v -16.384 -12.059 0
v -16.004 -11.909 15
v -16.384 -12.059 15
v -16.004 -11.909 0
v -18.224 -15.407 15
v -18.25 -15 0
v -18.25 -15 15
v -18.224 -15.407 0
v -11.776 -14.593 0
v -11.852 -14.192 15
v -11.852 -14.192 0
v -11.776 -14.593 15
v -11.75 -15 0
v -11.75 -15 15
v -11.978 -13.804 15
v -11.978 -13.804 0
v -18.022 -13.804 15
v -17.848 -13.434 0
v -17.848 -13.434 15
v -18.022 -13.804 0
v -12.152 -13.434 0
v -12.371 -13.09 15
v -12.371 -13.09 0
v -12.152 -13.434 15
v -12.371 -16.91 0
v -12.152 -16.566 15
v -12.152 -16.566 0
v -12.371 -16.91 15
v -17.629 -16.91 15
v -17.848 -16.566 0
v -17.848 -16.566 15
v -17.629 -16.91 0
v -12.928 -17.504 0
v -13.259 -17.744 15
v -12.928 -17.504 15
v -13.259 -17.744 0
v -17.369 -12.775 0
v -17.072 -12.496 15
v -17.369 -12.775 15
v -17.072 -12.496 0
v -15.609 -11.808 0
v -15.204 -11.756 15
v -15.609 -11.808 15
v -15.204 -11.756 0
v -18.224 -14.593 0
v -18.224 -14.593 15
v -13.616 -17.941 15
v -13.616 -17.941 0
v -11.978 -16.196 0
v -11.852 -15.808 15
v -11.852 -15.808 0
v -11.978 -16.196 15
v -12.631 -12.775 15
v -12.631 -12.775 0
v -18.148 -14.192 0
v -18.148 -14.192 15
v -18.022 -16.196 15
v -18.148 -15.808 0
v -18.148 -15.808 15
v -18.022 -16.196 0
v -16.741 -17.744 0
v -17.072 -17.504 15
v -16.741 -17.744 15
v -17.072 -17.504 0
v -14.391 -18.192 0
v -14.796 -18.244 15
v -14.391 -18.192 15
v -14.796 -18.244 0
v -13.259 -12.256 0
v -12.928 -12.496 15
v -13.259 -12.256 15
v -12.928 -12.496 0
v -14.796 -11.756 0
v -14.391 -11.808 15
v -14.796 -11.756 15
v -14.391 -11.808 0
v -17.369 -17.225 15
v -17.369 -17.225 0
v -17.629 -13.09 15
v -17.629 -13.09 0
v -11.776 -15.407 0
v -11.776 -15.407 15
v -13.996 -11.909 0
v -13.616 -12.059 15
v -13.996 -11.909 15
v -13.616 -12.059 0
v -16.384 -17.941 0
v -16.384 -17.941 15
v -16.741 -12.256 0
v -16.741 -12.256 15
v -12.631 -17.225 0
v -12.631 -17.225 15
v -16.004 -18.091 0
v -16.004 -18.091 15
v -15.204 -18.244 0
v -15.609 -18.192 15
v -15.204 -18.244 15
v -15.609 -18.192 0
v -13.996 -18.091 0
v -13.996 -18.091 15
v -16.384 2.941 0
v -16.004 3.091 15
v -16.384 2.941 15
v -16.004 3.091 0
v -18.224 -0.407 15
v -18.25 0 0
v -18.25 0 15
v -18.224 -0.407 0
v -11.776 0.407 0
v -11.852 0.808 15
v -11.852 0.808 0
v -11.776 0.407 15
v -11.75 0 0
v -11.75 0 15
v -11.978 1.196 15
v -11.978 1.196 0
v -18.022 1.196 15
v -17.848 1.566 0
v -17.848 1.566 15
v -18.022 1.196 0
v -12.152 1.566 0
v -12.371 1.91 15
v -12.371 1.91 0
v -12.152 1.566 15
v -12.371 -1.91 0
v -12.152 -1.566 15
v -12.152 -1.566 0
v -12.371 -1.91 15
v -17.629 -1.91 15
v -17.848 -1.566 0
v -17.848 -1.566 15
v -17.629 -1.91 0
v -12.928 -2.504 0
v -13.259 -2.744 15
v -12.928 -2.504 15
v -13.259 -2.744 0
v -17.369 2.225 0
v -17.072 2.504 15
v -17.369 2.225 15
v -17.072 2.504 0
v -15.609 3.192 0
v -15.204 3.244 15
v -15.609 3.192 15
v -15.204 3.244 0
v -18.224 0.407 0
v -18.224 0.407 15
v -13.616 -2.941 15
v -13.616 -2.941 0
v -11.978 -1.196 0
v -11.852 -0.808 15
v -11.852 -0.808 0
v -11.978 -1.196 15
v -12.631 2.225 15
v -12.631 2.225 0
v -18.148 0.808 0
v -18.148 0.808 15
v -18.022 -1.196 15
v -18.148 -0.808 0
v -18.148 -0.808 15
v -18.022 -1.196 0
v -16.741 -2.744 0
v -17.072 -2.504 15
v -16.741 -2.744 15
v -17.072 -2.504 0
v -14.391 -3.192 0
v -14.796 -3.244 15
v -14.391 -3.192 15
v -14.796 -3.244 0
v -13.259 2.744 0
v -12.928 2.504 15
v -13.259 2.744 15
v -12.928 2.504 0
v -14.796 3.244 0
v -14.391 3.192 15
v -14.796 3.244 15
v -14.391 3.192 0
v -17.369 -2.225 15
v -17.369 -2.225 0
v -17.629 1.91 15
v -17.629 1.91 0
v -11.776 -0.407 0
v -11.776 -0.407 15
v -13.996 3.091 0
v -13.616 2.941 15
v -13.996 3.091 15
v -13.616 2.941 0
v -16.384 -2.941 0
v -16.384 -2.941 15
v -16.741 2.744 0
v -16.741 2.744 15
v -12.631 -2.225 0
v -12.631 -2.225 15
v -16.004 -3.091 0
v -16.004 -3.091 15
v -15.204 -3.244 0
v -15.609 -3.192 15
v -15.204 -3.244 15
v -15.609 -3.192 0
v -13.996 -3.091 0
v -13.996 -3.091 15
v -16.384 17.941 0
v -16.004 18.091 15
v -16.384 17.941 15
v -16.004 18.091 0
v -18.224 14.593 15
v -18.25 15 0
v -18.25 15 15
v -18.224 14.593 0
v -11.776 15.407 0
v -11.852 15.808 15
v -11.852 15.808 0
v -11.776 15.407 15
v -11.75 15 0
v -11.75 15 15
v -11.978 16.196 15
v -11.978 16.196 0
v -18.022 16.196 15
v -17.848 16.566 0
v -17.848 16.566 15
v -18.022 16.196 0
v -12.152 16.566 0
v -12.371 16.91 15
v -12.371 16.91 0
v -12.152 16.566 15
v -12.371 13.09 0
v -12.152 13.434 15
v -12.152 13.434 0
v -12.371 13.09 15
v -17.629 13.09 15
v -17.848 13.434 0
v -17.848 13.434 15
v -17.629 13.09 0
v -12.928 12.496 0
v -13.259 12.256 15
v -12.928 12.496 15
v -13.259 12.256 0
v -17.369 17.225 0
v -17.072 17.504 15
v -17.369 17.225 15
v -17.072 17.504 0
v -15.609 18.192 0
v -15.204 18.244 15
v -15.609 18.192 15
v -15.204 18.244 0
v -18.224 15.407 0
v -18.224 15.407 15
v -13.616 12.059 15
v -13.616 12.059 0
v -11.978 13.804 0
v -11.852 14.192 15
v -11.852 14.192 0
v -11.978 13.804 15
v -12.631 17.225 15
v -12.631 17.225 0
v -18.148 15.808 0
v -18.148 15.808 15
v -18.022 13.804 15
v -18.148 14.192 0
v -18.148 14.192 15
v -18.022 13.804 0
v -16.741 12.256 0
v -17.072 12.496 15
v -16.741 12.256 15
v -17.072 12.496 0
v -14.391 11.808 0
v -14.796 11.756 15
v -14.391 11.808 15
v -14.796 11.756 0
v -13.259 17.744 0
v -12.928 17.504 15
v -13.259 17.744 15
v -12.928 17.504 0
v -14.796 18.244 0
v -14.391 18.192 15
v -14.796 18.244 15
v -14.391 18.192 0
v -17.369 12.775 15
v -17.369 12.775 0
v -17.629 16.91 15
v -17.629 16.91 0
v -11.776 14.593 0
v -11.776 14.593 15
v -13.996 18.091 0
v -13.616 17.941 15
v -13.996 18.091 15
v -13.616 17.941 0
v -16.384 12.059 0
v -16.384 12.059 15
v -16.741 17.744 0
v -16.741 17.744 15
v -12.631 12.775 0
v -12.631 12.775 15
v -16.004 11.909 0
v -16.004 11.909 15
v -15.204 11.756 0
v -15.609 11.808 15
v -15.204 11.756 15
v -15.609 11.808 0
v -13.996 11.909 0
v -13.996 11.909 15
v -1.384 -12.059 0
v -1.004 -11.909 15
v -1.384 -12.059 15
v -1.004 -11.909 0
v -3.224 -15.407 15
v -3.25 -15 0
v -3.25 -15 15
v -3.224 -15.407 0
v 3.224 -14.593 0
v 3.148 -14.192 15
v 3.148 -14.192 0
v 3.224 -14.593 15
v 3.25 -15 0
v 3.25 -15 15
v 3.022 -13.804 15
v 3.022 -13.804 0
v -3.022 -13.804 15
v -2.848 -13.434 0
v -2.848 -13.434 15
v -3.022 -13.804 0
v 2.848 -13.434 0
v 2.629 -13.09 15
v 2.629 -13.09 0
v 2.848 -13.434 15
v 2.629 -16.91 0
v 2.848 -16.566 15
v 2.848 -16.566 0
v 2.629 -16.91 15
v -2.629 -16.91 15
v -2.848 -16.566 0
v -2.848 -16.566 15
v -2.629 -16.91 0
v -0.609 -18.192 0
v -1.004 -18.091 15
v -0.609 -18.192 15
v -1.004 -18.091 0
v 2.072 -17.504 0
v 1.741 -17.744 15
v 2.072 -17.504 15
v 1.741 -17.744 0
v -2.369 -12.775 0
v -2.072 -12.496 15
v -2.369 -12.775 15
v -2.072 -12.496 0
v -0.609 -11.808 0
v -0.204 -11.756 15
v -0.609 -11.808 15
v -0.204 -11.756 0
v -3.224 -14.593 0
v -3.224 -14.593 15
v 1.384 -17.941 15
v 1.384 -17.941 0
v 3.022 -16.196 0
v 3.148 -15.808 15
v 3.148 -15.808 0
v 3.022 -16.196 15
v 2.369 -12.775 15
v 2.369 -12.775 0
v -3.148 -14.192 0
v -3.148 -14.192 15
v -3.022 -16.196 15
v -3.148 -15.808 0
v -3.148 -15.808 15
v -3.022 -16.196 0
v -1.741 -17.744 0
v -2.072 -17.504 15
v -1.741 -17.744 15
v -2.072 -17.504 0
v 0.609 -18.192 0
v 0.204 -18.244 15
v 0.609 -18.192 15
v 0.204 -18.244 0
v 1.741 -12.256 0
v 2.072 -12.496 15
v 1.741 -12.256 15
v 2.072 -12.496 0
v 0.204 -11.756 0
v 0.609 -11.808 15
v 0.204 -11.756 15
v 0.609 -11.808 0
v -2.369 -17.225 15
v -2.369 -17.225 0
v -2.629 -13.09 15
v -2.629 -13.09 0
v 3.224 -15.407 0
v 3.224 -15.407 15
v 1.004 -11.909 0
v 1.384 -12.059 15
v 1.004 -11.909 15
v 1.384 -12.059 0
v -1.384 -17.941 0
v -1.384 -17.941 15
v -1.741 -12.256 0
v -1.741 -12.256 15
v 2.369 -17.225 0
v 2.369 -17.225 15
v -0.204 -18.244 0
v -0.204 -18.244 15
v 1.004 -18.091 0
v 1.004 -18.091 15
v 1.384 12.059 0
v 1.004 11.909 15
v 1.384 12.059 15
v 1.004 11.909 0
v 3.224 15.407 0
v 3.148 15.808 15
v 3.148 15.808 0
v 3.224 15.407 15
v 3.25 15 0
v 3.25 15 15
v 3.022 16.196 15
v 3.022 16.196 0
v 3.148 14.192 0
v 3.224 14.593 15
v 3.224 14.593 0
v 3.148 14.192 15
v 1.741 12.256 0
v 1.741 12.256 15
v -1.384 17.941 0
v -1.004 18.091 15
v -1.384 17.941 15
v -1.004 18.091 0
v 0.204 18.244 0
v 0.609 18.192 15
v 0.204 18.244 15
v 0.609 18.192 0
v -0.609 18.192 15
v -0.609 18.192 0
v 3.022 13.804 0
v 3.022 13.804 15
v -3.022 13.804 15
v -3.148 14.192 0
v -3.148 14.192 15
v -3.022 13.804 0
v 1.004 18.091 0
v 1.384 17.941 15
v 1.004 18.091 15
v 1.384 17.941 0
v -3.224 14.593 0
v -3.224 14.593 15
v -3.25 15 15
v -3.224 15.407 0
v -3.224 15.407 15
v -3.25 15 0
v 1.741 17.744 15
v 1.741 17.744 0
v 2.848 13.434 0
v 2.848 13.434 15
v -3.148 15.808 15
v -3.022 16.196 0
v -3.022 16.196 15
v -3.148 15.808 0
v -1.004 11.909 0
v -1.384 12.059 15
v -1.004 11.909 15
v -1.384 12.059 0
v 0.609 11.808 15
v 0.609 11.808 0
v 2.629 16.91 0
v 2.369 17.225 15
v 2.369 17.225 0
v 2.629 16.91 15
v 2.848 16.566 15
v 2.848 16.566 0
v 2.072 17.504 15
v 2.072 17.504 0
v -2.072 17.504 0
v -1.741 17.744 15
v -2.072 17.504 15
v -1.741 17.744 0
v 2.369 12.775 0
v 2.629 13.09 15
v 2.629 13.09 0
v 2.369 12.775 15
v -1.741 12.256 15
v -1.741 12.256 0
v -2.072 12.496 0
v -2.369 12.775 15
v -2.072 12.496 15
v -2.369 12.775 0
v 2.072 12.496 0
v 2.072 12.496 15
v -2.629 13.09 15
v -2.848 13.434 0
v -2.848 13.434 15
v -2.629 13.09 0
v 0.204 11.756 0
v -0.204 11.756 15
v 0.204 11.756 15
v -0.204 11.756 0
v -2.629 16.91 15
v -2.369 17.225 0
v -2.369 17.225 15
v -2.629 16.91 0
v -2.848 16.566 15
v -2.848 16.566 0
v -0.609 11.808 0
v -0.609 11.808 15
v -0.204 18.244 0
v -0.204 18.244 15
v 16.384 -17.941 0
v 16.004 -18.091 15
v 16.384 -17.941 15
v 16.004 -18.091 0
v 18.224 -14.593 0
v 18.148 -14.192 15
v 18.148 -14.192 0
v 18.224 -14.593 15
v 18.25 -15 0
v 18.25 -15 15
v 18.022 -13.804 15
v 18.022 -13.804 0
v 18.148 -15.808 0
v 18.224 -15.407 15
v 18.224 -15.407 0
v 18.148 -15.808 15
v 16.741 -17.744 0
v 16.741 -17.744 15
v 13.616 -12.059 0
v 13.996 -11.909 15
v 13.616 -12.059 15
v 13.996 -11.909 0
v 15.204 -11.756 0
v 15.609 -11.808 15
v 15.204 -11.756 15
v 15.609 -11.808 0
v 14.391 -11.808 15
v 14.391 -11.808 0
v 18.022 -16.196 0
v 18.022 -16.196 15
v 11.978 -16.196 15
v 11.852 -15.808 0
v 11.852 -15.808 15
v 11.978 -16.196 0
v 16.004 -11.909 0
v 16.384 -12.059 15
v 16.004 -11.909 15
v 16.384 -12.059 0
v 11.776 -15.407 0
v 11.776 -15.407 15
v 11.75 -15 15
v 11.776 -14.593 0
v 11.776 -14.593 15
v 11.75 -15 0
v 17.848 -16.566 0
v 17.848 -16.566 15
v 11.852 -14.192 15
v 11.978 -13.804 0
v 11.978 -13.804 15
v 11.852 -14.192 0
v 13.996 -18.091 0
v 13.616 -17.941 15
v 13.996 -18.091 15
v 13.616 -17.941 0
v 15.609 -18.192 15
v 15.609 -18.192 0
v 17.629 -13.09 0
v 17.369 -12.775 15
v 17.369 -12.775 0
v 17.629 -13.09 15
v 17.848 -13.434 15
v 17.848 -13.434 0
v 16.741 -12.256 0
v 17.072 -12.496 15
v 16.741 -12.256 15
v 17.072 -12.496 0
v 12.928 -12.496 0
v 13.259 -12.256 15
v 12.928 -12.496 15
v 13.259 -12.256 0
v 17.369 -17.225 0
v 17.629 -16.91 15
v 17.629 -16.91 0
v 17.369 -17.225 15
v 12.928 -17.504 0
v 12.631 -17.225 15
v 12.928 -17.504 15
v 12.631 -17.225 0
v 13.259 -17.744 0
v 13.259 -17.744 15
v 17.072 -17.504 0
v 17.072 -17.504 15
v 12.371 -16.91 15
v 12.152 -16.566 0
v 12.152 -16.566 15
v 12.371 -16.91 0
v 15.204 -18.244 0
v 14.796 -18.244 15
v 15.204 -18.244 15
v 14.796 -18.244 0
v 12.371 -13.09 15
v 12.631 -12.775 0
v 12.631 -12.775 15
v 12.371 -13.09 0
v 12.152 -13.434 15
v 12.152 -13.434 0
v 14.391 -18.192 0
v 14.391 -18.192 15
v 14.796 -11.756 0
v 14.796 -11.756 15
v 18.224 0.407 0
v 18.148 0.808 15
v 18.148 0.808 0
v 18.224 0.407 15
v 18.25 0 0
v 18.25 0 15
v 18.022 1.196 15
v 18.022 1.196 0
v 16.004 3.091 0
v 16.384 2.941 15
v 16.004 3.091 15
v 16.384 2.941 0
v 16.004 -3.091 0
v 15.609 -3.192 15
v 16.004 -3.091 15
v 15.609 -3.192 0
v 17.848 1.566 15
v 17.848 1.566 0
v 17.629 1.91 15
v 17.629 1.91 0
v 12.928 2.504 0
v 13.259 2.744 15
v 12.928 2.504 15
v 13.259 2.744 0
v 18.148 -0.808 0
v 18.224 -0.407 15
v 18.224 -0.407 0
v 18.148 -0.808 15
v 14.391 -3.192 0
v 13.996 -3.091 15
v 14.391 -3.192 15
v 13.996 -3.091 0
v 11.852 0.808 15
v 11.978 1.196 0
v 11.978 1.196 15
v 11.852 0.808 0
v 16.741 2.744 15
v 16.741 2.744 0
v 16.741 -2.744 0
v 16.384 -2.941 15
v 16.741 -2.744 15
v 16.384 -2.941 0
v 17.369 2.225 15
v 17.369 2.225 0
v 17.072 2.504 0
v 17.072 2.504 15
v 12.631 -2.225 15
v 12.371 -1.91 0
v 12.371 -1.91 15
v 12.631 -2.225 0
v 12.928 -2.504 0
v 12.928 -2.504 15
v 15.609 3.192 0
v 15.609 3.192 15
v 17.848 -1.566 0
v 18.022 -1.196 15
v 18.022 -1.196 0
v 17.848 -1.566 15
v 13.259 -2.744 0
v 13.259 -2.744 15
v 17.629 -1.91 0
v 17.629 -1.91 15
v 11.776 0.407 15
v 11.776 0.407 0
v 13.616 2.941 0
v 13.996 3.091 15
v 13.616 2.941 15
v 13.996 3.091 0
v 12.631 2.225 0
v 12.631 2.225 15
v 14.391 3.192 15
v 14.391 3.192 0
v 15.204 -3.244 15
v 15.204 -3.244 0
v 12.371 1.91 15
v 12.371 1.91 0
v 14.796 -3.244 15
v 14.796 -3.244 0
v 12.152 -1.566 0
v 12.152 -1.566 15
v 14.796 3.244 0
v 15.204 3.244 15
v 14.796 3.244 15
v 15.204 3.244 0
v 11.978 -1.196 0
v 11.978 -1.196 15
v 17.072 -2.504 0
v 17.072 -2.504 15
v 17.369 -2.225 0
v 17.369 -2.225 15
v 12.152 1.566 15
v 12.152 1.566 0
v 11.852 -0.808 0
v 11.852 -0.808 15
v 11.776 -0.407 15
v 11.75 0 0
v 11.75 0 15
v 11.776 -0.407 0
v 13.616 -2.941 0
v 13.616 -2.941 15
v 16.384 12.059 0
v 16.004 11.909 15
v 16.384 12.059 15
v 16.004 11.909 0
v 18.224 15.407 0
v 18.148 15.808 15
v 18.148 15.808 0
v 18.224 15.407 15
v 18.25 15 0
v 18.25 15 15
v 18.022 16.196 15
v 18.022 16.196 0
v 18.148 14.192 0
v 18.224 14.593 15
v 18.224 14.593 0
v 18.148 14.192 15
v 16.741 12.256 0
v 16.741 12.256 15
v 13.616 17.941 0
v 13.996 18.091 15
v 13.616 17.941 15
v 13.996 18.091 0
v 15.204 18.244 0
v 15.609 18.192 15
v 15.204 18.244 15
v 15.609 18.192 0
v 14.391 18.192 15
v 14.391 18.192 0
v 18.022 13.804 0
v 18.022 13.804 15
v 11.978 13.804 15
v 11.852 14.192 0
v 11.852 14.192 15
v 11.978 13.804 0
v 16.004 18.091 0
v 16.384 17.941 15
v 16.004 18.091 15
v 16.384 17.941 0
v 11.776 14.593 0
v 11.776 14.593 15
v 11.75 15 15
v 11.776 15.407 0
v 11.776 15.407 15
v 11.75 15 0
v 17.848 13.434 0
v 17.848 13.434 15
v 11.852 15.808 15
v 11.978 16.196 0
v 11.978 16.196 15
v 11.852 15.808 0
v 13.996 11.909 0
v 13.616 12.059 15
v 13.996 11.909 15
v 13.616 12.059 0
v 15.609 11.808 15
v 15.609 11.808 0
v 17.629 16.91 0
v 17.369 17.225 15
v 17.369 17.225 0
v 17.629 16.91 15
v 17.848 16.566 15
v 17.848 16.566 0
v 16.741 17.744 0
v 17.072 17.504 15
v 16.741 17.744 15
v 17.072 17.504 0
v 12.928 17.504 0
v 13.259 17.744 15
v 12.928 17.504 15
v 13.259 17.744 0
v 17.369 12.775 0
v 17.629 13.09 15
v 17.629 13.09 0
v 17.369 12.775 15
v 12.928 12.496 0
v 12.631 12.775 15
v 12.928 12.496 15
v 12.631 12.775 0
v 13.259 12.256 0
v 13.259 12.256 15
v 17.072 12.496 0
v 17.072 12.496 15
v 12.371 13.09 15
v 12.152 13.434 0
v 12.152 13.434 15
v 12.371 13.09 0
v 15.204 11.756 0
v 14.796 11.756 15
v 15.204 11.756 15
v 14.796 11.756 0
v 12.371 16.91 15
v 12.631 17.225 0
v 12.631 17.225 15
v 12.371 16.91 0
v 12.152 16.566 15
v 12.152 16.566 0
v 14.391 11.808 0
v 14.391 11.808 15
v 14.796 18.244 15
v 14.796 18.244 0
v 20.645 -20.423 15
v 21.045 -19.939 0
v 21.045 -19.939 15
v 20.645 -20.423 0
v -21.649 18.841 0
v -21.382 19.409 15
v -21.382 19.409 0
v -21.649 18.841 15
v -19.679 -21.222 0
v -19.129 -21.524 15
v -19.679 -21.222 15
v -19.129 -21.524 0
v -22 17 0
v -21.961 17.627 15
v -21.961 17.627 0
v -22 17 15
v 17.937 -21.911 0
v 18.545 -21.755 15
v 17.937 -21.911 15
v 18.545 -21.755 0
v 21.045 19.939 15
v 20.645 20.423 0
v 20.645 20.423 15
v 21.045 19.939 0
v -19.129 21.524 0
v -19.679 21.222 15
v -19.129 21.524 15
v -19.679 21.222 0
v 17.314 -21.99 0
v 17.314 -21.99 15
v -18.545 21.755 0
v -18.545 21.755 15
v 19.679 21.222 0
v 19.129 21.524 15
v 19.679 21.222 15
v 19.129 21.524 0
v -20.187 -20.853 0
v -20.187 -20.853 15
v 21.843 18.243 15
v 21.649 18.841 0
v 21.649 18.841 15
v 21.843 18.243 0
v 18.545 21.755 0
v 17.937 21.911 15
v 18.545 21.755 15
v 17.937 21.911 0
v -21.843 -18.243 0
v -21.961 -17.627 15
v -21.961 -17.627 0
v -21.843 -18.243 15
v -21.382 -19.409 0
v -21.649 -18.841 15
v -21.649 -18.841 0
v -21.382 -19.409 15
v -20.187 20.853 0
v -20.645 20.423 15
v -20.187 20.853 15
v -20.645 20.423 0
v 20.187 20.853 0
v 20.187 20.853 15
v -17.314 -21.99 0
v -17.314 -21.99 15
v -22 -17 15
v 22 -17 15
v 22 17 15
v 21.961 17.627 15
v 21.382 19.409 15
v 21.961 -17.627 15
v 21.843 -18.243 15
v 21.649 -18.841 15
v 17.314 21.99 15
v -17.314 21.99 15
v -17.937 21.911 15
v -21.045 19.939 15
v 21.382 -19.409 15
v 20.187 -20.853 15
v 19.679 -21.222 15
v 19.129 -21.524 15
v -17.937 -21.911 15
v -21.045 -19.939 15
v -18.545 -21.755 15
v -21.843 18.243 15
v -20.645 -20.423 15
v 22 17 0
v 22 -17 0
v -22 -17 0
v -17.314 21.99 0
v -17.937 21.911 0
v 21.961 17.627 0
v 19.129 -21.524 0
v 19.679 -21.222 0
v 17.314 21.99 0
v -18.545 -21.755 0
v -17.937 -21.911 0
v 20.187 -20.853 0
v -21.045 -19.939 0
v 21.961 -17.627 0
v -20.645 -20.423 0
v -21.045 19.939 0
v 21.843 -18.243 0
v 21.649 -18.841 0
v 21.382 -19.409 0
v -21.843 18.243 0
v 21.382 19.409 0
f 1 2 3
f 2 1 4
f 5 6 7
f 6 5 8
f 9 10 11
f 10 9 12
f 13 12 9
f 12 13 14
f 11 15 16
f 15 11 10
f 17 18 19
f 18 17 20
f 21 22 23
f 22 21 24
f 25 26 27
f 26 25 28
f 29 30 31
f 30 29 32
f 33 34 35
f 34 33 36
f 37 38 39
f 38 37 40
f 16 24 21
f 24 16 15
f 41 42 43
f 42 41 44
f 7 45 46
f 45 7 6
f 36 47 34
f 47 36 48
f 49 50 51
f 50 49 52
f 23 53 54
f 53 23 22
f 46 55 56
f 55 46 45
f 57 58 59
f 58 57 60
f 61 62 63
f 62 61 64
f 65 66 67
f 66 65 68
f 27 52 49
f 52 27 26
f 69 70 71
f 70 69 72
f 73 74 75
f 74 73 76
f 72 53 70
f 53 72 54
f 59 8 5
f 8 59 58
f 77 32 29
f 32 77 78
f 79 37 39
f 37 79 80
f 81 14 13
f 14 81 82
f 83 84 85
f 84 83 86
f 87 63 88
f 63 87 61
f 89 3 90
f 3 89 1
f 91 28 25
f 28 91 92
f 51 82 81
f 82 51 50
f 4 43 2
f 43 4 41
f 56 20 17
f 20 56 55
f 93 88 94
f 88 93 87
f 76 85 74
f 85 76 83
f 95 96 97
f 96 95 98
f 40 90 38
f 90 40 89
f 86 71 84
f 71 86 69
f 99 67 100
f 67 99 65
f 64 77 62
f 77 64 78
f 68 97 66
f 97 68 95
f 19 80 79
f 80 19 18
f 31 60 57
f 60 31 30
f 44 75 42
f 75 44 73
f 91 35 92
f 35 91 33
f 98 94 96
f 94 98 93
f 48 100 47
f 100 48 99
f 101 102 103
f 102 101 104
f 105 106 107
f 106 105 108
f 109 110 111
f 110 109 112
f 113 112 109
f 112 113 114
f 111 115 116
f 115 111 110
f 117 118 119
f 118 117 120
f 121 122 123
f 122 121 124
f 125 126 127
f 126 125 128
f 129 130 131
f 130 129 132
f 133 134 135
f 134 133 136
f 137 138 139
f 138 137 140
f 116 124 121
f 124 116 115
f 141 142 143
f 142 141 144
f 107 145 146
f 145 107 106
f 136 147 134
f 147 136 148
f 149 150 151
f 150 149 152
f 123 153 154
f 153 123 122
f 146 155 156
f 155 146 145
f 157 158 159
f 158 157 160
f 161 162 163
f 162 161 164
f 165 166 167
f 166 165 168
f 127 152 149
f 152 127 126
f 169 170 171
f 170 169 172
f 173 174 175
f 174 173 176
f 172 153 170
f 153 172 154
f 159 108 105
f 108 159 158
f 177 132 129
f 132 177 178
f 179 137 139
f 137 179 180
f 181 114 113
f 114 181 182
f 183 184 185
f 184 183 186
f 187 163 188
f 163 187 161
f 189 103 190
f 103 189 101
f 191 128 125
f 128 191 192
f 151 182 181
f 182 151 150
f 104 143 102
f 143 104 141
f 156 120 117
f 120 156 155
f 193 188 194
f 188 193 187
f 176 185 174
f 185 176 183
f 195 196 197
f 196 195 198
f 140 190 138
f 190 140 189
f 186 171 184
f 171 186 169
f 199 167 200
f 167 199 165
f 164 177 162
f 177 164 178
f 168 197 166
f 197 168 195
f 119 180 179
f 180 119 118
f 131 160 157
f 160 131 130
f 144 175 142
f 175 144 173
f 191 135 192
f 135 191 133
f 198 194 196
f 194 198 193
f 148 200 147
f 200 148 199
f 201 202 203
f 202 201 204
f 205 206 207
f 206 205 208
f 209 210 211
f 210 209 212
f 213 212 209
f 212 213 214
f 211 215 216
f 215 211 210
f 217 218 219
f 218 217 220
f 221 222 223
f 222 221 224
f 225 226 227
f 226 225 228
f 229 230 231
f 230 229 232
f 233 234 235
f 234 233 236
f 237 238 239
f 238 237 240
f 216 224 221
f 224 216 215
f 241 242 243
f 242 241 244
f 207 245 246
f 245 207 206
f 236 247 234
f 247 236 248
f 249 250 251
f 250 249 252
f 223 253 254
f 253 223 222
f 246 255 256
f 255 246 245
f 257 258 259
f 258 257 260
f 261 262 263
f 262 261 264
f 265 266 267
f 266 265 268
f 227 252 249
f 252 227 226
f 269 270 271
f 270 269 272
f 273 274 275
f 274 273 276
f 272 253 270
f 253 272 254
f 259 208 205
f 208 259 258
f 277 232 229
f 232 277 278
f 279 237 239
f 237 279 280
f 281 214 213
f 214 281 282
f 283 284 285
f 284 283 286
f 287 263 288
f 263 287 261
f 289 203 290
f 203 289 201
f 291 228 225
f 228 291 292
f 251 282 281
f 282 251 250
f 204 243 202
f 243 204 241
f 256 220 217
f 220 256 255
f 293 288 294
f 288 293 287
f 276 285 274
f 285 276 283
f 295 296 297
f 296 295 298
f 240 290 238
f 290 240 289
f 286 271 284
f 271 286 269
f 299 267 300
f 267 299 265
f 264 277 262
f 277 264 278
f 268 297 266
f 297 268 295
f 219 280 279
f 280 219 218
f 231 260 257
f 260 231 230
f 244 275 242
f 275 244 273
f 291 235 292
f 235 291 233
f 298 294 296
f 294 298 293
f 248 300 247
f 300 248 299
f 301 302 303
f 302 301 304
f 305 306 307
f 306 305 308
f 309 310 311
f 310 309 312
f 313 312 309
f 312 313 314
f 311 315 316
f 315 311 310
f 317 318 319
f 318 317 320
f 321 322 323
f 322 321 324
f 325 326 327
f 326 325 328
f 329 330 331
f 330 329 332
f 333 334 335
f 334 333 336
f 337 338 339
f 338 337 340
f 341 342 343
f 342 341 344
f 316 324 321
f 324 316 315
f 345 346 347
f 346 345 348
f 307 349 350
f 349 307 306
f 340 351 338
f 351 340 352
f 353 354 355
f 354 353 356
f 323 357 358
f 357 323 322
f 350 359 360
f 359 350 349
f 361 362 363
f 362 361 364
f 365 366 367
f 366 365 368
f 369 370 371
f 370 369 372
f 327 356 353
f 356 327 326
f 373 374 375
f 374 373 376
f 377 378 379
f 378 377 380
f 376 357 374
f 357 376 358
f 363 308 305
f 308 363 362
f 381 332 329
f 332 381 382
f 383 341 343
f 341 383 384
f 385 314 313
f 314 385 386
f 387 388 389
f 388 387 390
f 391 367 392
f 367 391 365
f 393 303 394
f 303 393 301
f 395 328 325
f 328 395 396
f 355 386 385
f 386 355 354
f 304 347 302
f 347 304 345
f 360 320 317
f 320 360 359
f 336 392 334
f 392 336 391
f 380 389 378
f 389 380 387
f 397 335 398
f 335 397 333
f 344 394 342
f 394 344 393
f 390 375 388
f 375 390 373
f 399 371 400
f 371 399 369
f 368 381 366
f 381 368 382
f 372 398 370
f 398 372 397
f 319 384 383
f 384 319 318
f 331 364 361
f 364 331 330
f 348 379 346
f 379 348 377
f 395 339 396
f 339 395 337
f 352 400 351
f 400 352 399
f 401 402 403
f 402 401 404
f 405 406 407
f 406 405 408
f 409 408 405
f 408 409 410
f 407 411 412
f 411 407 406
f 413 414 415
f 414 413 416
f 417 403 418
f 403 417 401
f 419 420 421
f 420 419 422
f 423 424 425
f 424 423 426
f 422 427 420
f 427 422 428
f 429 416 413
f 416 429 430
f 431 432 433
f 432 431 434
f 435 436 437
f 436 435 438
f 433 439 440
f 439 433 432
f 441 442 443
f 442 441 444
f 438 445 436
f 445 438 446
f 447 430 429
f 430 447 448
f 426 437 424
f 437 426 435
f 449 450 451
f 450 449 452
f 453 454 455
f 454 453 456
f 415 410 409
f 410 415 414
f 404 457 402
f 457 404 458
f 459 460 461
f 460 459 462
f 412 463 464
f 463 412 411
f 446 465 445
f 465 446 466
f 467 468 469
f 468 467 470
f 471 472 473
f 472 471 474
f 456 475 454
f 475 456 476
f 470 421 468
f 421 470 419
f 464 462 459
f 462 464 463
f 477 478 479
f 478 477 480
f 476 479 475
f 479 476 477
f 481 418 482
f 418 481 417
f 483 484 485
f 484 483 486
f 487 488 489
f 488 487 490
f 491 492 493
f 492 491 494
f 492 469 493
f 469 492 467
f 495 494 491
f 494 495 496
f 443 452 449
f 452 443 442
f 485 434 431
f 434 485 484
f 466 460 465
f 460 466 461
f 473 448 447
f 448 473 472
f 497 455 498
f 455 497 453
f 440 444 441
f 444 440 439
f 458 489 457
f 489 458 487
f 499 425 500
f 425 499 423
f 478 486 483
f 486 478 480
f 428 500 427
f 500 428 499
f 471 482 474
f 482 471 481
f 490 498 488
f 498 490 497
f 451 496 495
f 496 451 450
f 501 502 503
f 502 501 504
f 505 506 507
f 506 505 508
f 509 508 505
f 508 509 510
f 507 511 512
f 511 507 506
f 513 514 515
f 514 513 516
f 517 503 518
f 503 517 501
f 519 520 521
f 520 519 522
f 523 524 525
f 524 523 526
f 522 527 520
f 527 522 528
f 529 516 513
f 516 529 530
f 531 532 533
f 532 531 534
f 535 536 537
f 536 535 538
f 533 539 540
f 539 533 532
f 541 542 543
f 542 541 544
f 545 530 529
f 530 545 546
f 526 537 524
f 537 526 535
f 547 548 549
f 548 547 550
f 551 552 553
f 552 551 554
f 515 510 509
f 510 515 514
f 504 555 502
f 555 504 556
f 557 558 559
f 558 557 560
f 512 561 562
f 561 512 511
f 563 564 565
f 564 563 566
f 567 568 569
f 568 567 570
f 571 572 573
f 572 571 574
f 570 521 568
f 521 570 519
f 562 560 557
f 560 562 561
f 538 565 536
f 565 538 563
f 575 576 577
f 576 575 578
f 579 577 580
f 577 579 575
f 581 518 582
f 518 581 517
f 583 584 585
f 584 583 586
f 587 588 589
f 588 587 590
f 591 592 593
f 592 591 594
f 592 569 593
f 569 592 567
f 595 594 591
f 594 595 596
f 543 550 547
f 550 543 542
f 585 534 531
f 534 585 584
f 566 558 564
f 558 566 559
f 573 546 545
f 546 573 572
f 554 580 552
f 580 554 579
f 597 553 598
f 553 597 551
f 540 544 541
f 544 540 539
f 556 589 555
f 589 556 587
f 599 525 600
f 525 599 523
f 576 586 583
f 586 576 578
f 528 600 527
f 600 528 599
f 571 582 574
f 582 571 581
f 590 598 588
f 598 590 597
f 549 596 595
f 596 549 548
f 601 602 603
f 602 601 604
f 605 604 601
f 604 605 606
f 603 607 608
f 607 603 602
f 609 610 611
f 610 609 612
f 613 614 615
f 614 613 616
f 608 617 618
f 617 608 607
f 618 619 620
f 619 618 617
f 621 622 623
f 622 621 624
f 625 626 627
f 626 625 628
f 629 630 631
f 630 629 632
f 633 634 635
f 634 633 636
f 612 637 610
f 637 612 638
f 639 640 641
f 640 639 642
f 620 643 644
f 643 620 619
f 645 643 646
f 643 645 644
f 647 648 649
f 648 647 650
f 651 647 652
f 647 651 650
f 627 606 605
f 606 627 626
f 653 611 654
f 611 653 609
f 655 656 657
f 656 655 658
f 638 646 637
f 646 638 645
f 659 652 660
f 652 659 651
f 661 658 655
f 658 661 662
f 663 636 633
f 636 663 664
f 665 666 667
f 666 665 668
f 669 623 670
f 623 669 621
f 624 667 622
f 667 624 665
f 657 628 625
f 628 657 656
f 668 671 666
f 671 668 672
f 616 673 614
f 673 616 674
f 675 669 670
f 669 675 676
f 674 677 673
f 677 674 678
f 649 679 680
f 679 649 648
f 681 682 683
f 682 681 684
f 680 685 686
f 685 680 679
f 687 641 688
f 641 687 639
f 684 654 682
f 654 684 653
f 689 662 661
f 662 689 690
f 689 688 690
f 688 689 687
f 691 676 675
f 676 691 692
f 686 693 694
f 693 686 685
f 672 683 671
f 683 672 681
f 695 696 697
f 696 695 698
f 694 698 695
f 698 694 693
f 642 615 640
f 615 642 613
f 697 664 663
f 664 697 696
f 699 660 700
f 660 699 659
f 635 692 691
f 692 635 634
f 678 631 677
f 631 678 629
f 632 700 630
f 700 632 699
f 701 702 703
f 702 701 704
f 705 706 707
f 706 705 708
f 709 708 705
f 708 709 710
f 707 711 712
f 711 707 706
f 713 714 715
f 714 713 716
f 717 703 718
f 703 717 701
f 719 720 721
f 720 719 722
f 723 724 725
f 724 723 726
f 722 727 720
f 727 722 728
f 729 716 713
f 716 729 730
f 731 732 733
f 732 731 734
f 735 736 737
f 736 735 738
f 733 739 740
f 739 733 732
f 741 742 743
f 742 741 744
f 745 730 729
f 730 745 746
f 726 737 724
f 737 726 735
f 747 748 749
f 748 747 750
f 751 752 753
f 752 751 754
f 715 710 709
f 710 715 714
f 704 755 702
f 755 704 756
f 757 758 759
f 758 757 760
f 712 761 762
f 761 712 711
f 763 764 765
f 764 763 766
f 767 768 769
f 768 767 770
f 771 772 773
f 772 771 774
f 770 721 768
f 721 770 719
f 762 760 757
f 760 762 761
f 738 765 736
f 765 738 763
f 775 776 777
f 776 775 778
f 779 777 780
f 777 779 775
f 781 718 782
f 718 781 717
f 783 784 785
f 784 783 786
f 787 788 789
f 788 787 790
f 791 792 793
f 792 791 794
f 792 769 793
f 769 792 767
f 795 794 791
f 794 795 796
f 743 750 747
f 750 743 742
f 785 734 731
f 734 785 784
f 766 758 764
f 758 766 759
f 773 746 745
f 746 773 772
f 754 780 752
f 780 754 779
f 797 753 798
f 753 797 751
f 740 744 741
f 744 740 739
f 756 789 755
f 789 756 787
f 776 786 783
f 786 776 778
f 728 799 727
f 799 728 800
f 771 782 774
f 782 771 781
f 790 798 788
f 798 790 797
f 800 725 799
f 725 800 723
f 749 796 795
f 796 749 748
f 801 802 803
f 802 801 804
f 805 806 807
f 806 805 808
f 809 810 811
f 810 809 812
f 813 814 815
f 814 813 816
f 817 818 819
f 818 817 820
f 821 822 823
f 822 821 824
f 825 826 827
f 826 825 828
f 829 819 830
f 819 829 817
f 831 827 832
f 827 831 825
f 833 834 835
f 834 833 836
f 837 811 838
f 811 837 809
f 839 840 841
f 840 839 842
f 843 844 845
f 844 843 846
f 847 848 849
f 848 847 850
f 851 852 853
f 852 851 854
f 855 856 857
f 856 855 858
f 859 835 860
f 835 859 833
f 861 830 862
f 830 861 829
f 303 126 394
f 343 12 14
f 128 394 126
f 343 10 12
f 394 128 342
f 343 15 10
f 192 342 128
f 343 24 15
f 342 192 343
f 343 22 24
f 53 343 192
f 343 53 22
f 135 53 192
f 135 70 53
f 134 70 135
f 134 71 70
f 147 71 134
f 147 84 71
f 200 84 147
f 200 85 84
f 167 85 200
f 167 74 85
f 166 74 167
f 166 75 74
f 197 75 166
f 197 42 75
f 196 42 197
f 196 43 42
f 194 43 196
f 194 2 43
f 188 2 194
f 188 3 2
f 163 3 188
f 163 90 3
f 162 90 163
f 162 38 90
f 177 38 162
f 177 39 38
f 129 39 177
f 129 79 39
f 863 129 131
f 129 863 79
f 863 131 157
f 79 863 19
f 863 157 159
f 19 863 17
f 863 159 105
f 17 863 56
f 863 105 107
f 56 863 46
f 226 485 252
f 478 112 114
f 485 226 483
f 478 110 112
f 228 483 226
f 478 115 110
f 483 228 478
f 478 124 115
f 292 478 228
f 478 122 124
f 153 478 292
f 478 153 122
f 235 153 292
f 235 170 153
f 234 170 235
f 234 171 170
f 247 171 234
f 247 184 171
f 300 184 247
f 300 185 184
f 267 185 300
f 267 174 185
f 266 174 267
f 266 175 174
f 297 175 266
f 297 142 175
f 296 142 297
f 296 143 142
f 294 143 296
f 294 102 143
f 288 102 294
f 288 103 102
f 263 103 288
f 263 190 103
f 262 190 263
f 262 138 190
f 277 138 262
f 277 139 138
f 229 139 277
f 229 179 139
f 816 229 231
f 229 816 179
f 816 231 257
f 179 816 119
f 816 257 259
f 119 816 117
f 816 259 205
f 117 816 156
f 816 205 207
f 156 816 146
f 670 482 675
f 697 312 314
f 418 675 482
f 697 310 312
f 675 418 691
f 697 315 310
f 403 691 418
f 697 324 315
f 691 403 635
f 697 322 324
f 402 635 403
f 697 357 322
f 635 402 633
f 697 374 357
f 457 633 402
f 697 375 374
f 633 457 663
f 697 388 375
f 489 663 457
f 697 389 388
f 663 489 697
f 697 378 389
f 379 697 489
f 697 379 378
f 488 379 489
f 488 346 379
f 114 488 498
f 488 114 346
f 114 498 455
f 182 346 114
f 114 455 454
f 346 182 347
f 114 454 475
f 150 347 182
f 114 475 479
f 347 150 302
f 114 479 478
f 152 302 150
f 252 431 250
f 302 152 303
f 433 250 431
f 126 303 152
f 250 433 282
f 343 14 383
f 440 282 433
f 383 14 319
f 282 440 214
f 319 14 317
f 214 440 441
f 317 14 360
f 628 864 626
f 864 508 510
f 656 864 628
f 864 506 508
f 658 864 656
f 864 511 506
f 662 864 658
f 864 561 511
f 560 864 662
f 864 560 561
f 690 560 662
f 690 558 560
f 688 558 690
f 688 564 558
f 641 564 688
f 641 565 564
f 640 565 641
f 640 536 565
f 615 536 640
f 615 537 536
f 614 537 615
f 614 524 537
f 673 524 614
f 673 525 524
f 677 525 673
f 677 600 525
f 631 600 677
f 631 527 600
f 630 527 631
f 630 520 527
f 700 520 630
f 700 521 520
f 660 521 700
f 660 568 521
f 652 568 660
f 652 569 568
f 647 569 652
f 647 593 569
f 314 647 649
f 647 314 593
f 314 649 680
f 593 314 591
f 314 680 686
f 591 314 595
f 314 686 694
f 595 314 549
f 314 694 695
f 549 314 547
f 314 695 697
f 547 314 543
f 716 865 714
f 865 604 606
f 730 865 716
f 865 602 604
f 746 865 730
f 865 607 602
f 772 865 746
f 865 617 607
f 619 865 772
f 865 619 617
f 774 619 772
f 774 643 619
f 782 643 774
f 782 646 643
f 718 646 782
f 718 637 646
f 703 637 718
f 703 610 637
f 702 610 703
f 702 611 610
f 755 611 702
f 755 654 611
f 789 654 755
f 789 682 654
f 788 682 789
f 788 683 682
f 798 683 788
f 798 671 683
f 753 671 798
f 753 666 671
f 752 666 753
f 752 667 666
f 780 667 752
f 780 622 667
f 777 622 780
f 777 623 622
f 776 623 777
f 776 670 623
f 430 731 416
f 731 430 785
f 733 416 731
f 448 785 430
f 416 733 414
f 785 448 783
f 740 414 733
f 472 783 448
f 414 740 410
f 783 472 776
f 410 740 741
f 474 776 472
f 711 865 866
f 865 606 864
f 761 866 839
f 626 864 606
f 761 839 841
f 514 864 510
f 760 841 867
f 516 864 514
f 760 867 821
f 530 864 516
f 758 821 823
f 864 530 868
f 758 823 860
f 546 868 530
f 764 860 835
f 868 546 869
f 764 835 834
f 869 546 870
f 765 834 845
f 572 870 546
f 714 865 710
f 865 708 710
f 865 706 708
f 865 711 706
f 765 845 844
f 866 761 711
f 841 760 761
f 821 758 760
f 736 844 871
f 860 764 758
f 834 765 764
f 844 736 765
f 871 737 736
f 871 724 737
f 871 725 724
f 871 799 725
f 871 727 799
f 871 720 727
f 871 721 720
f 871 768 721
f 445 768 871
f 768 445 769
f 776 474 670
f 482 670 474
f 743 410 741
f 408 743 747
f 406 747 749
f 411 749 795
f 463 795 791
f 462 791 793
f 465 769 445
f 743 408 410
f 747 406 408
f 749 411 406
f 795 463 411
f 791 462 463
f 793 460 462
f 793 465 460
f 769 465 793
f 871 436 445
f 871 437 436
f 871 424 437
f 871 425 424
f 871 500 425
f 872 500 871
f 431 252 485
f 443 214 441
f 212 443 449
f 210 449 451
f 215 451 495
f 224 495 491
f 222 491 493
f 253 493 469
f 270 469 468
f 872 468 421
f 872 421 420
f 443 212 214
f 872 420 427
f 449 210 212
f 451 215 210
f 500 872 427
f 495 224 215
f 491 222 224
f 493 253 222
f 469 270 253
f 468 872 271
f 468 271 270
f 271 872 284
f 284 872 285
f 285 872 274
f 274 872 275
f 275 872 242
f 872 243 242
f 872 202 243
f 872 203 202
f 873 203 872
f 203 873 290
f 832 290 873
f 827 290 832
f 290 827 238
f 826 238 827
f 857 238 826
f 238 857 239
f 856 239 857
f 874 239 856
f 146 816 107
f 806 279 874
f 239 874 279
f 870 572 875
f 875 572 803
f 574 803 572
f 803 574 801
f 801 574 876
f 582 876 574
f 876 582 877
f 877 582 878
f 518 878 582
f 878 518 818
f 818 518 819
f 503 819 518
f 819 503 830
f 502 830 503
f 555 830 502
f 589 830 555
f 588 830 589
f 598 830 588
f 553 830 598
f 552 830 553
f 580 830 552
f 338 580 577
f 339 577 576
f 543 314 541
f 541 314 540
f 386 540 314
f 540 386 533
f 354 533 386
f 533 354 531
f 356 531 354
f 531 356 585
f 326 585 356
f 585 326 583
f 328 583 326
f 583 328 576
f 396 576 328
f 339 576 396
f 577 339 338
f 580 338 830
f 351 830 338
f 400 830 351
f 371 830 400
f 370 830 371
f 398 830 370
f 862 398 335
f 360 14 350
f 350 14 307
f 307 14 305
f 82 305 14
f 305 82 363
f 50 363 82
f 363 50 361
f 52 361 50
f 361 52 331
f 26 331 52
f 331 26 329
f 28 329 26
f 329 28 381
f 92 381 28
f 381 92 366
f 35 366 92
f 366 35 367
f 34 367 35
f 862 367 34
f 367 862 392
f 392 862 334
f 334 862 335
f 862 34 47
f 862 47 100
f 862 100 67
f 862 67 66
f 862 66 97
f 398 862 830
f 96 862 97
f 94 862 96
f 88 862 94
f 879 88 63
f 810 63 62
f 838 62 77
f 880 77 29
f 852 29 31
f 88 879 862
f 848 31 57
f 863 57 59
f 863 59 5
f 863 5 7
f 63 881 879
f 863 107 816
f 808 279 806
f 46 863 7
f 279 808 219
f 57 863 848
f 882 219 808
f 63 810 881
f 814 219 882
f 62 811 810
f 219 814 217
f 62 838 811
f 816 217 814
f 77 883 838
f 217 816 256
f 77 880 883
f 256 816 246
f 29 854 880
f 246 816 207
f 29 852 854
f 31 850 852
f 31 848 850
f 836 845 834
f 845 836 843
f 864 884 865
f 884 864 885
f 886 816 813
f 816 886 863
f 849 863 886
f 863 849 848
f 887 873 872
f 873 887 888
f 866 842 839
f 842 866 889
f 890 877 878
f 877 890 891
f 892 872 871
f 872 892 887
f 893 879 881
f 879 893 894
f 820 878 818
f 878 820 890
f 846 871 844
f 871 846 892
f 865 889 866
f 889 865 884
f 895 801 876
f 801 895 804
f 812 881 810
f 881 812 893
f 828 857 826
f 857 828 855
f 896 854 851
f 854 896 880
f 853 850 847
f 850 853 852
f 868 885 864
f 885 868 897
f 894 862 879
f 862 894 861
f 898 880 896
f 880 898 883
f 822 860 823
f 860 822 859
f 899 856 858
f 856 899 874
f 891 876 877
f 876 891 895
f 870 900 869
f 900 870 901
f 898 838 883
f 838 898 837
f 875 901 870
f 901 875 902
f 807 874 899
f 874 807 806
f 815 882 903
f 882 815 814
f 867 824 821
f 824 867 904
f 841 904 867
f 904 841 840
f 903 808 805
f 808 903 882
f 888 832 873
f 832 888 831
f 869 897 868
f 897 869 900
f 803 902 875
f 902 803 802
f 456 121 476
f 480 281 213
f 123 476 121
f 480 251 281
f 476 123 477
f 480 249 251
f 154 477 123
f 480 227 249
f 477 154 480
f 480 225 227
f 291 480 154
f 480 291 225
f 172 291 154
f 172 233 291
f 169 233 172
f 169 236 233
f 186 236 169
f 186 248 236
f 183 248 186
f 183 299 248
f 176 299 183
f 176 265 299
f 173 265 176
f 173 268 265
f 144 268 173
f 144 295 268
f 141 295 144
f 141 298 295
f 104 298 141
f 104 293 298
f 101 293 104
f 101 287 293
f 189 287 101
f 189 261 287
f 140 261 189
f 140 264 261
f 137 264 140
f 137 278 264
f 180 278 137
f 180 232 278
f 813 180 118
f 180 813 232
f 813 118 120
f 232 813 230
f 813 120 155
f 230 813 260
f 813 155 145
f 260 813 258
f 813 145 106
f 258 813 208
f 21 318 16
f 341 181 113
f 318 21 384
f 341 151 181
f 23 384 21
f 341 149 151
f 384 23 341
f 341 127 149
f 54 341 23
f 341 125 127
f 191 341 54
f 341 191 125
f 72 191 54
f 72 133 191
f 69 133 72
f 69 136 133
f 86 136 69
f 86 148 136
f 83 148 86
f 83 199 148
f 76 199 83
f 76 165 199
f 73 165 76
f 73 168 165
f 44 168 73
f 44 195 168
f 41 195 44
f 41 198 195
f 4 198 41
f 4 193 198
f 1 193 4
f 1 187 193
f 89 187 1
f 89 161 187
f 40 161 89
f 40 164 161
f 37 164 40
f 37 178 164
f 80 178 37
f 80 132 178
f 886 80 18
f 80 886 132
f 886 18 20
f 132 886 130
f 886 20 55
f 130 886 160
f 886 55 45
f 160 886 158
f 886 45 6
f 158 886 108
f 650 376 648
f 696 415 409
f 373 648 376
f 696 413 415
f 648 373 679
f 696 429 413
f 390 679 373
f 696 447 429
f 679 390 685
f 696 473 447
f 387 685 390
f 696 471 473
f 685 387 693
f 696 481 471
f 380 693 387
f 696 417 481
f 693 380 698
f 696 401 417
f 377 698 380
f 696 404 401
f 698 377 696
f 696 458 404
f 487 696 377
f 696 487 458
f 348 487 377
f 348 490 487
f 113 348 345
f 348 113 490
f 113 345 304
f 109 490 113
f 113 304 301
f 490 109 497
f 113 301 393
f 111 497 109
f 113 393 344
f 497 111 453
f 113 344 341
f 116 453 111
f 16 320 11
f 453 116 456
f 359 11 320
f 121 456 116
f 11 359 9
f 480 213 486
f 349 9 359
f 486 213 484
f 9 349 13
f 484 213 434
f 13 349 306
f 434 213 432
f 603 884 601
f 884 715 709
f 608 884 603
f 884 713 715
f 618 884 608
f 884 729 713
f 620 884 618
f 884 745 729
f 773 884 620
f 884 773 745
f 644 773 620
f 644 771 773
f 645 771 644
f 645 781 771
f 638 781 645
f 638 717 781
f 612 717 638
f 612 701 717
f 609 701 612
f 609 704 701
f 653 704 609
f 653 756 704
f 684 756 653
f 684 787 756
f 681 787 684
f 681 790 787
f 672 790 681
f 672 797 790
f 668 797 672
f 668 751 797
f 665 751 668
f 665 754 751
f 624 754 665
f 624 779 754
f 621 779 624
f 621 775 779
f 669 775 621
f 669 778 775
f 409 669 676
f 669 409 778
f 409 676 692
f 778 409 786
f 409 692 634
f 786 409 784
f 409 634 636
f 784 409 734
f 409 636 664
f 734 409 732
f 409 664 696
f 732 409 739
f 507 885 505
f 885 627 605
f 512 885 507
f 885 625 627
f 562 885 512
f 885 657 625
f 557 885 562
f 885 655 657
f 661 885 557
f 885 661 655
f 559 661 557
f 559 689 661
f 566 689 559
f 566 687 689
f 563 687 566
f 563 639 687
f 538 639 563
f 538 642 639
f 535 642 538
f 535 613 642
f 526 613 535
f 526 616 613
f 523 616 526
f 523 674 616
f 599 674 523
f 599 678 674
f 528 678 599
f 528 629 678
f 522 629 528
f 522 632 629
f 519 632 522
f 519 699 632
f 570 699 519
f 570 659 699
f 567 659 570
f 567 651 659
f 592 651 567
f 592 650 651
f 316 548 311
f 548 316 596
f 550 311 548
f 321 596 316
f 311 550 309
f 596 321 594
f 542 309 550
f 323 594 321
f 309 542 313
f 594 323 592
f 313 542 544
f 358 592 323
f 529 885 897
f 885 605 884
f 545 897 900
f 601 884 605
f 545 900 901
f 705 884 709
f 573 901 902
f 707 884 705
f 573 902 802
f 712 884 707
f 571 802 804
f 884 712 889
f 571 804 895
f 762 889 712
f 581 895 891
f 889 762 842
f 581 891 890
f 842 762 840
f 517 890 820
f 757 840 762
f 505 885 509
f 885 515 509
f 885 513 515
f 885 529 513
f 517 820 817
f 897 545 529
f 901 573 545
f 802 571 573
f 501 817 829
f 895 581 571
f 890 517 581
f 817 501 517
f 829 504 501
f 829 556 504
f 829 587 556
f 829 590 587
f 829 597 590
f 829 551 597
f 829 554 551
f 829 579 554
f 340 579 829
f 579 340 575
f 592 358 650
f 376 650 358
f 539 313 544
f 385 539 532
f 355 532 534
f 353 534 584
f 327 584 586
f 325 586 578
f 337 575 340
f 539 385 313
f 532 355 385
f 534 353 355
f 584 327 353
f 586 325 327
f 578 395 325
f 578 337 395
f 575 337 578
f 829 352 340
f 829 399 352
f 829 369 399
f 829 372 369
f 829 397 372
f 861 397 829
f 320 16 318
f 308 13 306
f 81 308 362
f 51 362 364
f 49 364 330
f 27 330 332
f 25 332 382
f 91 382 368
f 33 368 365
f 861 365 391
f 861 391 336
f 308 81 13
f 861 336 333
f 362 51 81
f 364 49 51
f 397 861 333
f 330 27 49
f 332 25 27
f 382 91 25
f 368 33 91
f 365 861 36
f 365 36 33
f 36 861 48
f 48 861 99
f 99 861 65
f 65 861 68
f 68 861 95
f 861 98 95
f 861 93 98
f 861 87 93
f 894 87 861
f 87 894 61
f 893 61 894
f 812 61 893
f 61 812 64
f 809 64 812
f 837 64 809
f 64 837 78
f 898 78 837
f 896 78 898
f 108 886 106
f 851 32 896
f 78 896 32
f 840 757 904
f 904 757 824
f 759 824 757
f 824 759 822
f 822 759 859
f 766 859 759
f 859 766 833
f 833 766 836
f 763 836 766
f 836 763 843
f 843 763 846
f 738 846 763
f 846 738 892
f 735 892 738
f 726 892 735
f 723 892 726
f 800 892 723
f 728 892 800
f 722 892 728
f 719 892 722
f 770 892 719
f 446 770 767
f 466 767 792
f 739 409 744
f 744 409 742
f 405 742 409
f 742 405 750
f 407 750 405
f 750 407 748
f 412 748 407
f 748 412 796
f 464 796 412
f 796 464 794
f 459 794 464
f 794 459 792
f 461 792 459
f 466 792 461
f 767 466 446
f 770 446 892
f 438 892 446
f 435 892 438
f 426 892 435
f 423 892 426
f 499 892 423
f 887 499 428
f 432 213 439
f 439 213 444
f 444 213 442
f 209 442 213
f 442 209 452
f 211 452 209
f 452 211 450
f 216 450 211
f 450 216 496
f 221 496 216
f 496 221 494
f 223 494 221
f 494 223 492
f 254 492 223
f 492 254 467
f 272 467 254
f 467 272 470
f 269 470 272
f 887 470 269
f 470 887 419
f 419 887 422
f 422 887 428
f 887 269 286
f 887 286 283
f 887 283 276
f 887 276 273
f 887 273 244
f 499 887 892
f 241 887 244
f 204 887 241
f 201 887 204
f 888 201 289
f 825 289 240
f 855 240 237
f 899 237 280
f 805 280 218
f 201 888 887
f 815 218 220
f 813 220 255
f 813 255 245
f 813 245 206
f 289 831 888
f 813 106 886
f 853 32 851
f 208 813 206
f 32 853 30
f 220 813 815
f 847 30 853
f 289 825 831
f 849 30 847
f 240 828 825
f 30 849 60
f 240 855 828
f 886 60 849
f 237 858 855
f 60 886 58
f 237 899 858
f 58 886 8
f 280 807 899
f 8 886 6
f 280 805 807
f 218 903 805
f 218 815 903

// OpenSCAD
$fn = 50;


difference() {
	union() {
		hull() {
			translate(v = [-17.0000000000, 17.0000000000, 0]) {
				cylinder(h = 15, r = 5);
			}
			translate(v = [17.0000000000, 17.0000000000, 0]) {
				cylinder(h = 15, r = 5);
			}
			translate(v = [-17.0000000000, -17.0000000000, 0]) {
				cylinder(h = 15, r = 5);
			}
			translate(v = [17.0000000000, -17.0000000000, 0]) {
				cylinder(h = 15, r = 5);
			}
		}
	}
	union() {
		translate(v = [-15.0000000000, -15.0000000000, -100.0000000000]) {
			cylinder(h = 200, r = 3.2500000000);
		}
		translate(v = [-15.0000000000, 0.0000000000, -100.0000000000]) {
			cylinder(h = 200, r = 3.2500000000);
		}
		translate(v = [-15.0000000000, 15.0000000000, -100.0000000000]) {
			cylinder(h = 200, r = 3.2500000000);
		}
		translate(v = [0.0000000000, -15.0000000000, -100.0000000000]) {
			cylinder(h = 200, r = 3.2500000000);
		}
		translate(v = [0.0000000000, 15.0000000000, -100.0000000000]) {
			cylinder(h = 200, r = 3.2500000000);
		}
		translate(v = [15.0000000000, -15.0000000000, -100.0000000000]) {
			cylinder(h = 200, r = 3.2500000000);
		}
		translate(v = [15.0000000000, 0.0000000000, -100.0000000000]) {
			cylinder(h = 200, r = 3.2500000000);
		}
		translate(v = [15.0000000000, 15.0000000000, -100.0000000000]) {
			cylinder(h = 200, r = 3.2500000000);
		}
	}
}
